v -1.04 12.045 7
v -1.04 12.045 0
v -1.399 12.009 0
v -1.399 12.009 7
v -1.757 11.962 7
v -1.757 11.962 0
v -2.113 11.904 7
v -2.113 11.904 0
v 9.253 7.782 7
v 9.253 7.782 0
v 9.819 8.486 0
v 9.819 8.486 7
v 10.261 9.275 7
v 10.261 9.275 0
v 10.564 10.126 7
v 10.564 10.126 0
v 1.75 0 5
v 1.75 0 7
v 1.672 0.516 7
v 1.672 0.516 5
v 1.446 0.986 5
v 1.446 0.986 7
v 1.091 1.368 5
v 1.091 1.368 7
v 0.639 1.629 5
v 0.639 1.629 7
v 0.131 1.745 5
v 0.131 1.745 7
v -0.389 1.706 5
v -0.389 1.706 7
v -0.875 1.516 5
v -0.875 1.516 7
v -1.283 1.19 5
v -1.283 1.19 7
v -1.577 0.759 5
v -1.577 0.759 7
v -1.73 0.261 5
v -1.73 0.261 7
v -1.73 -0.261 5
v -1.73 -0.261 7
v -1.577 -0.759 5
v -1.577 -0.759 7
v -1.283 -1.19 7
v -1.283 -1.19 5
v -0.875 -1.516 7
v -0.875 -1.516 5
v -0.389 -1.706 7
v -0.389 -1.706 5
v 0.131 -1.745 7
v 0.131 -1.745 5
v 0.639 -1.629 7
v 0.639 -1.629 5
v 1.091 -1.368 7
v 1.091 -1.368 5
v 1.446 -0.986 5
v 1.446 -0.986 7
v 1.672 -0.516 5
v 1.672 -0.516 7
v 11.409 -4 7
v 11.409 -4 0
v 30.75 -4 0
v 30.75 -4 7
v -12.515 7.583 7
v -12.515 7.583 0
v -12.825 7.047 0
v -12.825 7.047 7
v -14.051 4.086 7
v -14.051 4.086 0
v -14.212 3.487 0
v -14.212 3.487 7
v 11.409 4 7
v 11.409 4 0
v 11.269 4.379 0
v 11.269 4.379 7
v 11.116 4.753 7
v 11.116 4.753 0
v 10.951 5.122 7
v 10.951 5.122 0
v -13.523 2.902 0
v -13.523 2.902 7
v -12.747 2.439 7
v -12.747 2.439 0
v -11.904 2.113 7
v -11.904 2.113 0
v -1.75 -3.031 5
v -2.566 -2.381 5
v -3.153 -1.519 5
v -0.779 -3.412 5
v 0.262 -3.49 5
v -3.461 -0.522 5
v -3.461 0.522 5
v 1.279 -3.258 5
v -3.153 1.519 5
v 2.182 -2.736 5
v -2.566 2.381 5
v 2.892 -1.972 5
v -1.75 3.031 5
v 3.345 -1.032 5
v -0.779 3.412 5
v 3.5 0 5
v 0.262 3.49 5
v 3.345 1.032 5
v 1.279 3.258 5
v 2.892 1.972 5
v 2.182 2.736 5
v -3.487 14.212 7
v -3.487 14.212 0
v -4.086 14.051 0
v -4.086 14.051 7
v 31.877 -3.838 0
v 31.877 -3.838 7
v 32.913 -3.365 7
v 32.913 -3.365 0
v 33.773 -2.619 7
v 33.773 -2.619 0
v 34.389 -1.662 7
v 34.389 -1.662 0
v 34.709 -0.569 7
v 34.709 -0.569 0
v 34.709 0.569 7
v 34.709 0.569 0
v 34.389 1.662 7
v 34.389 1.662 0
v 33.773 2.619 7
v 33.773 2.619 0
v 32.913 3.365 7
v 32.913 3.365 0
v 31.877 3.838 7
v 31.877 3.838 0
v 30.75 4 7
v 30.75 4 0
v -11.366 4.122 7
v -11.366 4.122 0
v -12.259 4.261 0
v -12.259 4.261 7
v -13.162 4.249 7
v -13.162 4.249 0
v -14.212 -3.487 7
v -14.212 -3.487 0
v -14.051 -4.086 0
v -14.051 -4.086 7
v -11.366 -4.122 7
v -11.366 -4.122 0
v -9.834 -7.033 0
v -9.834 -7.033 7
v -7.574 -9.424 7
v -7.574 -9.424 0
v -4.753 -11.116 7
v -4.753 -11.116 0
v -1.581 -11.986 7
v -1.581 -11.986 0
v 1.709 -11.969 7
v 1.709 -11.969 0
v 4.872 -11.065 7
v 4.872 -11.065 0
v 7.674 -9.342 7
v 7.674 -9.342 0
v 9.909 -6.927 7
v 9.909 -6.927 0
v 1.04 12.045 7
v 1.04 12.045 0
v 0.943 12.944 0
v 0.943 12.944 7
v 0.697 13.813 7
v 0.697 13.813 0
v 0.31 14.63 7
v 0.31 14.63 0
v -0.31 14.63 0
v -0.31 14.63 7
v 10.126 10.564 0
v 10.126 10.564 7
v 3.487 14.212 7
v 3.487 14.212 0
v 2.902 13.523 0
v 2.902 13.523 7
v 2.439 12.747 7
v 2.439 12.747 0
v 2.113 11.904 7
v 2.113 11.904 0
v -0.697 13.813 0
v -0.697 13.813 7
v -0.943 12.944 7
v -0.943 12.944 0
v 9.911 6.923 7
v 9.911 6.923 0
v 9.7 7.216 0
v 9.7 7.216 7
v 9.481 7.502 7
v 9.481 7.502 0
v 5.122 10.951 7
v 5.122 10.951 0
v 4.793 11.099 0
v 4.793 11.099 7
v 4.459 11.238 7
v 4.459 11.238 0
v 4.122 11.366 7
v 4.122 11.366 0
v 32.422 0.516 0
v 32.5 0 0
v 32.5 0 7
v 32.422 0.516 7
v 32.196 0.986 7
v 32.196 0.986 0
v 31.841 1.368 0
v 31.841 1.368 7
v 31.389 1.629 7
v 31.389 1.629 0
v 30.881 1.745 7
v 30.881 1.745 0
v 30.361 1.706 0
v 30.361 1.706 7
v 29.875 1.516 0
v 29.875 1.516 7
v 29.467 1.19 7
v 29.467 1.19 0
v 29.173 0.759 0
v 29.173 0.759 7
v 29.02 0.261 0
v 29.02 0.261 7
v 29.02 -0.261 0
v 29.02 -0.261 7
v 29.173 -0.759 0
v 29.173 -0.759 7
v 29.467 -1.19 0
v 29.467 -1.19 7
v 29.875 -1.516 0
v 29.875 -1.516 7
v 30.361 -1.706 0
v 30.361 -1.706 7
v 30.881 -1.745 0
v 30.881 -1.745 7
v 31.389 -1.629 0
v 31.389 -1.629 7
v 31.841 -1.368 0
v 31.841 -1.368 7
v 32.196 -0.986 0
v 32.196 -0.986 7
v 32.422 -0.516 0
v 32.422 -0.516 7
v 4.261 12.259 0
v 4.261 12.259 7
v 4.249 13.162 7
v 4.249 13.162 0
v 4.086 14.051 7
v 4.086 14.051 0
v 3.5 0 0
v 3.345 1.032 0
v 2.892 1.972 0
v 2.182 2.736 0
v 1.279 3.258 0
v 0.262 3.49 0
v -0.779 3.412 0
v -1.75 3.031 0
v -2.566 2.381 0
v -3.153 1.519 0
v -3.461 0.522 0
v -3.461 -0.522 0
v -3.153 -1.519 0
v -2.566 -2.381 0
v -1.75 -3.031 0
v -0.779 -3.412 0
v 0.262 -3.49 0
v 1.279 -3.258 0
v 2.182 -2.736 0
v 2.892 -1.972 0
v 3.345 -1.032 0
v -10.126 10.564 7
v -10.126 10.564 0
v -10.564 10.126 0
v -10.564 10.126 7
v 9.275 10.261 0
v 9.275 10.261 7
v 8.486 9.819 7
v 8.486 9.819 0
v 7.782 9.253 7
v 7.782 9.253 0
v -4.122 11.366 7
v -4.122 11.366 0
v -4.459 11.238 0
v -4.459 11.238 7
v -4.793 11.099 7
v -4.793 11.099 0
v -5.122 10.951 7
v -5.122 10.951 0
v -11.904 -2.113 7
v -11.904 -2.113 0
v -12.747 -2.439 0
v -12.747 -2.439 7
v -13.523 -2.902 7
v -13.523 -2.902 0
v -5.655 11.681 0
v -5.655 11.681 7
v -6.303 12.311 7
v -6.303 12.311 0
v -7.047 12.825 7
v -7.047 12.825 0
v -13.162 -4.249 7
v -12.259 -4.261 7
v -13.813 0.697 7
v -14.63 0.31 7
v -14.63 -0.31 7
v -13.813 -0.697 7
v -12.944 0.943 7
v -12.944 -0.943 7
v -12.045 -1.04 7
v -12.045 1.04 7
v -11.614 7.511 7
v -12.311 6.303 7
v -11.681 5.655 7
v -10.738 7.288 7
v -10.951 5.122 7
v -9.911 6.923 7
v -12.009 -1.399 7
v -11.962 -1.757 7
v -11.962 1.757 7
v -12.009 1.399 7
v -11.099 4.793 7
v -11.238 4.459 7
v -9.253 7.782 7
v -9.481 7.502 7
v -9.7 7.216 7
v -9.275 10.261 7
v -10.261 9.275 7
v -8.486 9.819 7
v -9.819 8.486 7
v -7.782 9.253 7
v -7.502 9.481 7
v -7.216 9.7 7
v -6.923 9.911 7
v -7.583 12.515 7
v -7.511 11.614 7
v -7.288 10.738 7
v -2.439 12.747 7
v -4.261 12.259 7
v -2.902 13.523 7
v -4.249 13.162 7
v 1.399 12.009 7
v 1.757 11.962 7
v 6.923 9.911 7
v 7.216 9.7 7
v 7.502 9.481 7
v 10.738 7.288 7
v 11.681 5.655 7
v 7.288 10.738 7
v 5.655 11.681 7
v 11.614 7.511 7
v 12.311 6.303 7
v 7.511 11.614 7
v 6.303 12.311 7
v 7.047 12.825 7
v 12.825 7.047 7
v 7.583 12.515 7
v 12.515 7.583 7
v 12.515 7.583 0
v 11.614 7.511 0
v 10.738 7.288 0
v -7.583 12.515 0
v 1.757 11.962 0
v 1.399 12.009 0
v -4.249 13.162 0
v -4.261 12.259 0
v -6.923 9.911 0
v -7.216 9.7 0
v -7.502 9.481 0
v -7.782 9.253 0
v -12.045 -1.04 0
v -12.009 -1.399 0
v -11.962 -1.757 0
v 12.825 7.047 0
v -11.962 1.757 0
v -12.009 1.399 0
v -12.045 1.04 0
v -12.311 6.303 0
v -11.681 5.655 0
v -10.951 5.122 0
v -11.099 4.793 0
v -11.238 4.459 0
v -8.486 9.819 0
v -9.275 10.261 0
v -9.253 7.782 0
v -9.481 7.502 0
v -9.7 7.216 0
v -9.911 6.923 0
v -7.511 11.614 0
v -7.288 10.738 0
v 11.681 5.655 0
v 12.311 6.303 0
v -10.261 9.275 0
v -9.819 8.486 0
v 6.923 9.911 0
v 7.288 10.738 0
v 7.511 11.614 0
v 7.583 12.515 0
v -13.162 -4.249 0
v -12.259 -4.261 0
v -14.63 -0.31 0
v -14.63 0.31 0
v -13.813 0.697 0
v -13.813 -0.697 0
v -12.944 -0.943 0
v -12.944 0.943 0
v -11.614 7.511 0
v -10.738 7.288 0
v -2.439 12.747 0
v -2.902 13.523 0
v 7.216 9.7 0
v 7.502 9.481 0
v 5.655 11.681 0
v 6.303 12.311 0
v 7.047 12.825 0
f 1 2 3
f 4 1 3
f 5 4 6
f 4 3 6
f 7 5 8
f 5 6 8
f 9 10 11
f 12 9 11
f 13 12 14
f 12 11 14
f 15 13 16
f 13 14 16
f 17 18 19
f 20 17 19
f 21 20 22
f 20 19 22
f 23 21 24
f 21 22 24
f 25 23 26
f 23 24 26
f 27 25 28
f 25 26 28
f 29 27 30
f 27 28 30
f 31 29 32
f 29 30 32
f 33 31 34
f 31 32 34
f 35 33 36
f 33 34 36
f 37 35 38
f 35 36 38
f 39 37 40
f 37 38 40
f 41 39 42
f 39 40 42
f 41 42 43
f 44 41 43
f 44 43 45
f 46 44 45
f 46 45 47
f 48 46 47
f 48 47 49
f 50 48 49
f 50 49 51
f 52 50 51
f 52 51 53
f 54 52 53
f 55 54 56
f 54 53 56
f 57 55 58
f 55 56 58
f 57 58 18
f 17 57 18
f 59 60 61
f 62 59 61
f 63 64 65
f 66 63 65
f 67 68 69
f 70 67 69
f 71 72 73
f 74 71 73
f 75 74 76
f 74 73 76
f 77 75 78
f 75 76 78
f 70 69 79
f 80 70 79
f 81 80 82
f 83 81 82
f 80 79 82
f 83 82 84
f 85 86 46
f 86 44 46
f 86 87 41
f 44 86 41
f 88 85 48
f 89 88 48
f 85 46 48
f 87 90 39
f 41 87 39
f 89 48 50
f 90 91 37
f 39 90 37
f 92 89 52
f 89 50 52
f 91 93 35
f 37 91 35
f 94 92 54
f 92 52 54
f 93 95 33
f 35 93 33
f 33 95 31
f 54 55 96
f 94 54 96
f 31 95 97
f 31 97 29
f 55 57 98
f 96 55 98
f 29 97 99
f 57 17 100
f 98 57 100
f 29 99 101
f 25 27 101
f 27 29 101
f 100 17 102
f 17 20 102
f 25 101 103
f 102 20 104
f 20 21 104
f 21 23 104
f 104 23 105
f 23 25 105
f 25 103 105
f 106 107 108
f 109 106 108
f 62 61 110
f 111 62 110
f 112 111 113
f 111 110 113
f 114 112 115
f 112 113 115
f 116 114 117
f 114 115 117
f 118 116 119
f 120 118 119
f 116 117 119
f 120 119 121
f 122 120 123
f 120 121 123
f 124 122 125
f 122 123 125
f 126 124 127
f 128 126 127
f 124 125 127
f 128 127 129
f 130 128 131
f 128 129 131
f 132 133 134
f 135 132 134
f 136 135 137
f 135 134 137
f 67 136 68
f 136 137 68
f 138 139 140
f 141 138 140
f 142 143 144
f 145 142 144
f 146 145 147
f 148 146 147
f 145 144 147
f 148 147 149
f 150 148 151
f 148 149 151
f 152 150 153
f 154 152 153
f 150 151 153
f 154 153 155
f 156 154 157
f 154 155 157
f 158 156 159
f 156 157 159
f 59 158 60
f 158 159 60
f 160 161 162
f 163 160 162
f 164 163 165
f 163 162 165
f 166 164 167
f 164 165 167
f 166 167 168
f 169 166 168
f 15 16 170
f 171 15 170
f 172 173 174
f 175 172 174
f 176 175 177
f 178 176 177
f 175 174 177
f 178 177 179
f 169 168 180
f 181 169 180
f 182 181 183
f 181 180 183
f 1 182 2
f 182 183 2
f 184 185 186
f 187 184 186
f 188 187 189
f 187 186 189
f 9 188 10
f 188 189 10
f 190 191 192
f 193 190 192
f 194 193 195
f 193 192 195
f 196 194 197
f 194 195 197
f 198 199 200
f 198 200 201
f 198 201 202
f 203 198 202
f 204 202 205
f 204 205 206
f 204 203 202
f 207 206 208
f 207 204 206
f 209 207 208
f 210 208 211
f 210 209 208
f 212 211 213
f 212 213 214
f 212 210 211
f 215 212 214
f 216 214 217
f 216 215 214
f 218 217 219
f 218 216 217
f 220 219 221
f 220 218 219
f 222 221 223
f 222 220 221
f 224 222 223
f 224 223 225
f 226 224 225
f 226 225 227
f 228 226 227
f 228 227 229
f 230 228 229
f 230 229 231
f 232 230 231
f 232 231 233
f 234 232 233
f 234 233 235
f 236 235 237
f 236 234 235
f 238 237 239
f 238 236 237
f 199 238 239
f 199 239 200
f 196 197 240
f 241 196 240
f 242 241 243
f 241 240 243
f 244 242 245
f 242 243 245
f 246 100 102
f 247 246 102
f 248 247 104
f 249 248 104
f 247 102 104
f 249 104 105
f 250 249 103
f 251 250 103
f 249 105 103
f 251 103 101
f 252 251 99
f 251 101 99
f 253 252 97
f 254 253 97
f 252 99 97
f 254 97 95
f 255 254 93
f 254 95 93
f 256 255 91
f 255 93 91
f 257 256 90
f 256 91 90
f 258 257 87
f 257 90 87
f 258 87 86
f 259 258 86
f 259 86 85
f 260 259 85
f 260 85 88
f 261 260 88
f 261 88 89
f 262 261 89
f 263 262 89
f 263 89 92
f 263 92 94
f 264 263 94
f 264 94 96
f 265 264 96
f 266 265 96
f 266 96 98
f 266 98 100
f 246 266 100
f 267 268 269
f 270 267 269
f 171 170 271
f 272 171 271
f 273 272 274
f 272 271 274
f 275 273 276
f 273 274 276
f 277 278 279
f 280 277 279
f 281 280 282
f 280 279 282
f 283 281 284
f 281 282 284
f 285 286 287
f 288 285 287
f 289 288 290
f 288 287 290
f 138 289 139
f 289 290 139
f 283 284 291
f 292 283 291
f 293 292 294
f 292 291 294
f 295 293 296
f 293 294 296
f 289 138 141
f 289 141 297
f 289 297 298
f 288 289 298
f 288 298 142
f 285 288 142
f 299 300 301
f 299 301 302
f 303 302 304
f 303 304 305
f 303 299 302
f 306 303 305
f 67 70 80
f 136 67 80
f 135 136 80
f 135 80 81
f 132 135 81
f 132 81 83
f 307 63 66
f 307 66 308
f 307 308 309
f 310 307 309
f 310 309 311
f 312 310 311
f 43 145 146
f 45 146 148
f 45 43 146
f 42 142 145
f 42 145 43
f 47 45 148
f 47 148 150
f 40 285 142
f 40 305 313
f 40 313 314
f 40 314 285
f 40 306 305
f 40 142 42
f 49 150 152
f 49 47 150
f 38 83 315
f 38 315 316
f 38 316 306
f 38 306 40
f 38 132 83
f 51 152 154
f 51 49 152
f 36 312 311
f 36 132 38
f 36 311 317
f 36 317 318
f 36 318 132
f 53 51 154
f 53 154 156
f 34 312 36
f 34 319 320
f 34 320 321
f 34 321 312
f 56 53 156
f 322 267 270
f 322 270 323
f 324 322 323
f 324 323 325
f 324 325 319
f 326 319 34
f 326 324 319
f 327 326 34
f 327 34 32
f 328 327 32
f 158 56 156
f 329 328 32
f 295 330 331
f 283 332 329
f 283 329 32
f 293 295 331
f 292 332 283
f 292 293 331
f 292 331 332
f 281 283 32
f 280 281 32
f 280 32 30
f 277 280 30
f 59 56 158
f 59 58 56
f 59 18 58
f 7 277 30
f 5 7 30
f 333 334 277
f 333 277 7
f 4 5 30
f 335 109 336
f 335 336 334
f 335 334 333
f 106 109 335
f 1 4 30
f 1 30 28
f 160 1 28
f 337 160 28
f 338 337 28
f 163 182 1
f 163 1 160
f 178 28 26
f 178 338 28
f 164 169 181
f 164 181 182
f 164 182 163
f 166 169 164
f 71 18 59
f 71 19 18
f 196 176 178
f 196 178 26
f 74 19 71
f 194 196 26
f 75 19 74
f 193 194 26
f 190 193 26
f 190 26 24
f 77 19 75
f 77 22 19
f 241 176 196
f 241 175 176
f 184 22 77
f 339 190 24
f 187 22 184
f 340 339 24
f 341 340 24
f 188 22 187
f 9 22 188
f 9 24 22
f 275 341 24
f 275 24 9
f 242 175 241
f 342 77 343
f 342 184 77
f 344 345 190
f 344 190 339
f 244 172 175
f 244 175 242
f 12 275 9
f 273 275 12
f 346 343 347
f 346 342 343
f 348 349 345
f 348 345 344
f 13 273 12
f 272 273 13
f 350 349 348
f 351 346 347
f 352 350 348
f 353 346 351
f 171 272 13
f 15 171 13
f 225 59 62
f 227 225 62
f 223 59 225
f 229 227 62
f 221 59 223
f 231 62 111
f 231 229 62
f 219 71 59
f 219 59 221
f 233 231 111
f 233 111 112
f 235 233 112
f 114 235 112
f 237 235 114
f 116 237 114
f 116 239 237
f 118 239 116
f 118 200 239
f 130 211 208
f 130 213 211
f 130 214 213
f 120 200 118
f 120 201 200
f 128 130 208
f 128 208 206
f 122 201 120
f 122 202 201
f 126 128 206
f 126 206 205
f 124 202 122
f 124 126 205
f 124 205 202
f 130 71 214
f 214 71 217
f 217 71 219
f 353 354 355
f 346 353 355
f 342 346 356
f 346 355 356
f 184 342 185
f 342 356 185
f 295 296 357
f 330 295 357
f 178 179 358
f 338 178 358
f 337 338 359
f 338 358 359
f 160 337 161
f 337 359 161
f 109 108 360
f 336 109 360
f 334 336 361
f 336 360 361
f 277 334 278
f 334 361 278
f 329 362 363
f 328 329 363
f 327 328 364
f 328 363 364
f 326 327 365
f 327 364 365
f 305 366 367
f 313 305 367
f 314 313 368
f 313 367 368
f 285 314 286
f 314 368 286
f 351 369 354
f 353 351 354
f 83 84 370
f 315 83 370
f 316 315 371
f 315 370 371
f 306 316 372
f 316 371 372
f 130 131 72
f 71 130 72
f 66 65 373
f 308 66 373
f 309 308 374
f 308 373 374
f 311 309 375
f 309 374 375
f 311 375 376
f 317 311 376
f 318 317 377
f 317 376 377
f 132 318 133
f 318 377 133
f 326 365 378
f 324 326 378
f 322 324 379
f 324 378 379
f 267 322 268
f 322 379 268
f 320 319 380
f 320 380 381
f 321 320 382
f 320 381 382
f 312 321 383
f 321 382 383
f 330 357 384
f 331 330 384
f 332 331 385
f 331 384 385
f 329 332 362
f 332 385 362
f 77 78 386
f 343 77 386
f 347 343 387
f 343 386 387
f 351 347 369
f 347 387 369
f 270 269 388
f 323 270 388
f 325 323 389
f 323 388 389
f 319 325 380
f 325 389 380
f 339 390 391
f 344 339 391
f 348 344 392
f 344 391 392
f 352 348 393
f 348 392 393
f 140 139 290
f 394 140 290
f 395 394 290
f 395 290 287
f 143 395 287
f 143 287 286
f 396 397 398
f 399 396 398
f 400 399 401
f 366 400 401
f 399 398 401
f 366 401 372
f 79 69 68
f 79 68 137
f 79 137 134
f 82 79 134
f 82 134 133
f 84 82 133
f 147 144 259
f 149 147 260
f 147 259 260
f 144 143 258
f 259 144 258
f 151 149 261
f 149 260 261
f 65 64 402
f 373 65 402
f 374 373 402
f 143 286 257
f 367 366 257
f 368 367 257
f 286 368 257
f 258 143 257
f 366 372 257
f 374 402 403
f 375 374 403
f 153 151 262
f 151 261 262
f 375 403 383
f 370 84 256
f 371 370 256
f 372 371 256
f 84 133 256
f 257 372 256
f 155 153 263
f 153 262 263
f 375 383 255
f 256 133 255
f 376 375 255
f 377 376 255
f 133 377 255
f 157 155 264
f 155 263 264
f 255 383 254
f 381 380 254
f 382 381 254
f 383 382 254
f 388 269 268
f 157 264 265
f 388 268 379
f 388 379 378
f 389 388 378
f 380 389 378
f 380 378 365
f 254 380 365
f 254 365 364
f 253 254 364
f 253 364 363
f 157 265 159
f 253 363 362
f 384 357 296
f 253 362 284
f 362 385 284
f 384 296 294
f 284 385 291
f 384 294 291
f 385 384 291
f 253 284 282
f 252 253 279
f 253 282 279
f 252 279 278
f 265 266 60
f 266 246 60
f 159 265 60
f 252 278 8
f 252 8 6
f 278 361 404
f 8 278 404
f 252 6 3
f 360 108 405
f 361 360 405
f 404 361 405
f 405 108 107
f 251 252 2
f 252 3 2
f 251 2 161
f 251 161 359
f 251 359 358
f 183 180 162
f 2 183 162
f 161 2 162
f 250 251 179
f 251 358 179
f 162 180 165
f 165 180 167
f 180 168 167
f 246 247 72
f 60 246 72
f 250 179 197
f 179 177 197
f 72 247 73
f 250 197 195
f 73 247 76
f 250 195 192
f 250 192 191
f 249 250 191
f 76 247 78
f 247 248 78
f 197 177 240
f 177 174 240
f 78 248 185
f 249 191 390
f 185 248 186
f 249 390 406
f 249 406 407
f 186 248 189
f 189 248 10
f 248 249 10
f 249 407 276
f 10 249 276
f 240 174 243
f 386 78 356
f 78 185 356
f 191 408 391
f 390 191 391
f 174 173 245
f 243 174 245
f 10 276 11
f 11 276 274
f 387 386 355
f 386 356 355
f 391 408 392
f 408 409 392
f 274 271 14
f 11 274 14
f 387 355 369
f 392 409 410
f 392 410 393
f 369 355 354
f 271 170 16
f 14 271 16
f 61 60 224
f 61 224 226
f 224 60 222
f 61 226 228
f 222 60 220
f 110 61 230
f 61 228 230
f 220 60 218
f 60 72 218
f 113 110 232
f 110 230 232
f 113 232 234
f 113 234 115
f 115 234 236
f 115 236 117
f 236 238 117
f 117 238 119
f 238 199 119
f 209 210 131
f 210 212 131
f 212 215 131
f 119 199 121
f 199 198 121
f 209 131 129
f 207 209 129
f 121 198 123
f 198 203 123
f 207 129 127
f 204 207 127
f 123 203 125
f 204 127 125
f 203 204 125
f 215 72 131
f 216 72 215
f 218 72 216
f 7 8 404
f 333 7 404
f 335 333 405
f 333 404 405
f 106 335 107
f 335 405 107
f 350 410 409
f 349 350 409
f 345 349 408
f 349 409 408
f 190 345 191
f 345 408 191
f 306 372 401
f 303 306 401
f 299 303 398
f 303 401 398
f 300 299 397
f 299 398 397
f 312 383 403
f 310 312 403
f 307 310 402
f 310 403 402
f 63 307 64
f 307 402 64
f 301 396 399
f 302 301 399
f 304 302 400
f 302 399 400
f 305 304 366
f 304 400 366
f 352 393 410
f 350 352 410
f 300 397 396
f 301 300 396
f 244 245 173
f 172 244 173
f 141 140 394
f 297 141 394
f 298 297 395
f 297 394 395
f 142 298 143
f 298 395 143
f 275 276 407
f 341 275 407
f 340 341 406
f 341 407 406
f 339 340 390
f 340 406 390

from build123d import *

# Parameters (mm, degrees)
SKETCH1_R           = 12.09
SKETCH1_R_2         = 1.75
BOSS_EXTRUDE2_DEPTH = 7
SKETCH2_R           = 3.5
CUT_EXTRUDE1_DEPTH  = 39.348395012
SKETCH3_R           = 3.5
SKETCH3_R_2         = 1.75
BOSS_EXTRUDE3_DEPTH = 2


with BuildPart() as part:
    # Sketch1 → Boss-Extrude2 (new body)
    # profile 1 of 17: a face of its own
    with BuildSketch(Plane.XY):
        Circle(SKETCH1_R)
    # profile 2 of 17: a face of its own
    with BuildSketch(Plane.XY):
        with BuildLine():
            ThreePointArc((-9.252623584, 7.781841479), (-8.548920985, 8.548920985), (-7.781841479, 9.252623584))
            ThreePointArc((-7.781841479, 9.252623584), (-8.870959341, 10.05645683), (-10.125769107, 10.564175311))
            Line((-10.125769107, 10.564175311), (-10.564175311, 10.125769107))
            ThreePointArc((-10.564175311, 10.125769107), (-10.05645683, 8.870959341), (-9.252623584, 7.781841479))
        make_face()
    # profile 3 of 17: a face of its own
    with BuildSketch(Plane.XY):
        with BuildLine():
            ThreePointArc((-6.9232593, 9.911436862), (-6.045, 10.470247132), (-5.12192646, 10.951436862))
            ThreePointArc((-5.12192646, 10.951436862), (-5.965886177, 12.009764599), (-7.046532125, 12.824951657))
            Line((-7.046532125, 12.824951657), (-7.583467875, 12.514951657))
            ThreePointArc((-7.583467875, 12.514951657), (-7.417818147, 11.171491285), (-6.9232593, 9.911436862))
        make_face()
    # profile 4 of 17: a face of its own
    with BuildSketch(Plane.XY):
        with BuildLine():
            ThreePointArc((-4.122086336, 11.365584201), (-3.129122255, 11.67804324), (-2.112960617, 11.903927815))
            ThreePointArc((-2.112960617, 11.903927815), (-2.65424773, 13.144626757), (-3.487085624, 14.211728743))
            Line((-3.487085624, 14.211728743), (-4.085959636, 14.051260935))
            ThreePointArc((-4.085959636, 14.051260935), (-4.273667417, 12.71070456), (-4.122086336, 11.365584201))
        make_face()
    # profile 5 of 17: a face of its own
    with BuildSketch(Plane.XY):
        with BuildLine():
            Line((0.31, 14.63), (-0.31, 14.63))
            ThreePointArc((-0.31, 14.63), (-0.838273314, 13.383704325), (-1.04, 12.04518576))
            ThreePointArc((-1.04, 12.04518576), (0, 12.09), (1.04, 12.04518576))
            ThreePointArc((1.04, 12.04518576), (0.838273314, 13.383704325), (0.31, 14.63))
        make_face()
    # profile 6 of 17: a face of its own
    with BuildSketch(Plane.XY):
        with BuildLine():
            ThreePointArc((3.487085624, 14.211728743), (2.65424773, 13.144626757), (2.112960617, 11.903927815))
            ThreePointArc((2.112960617, 11.903927815), (3.129122255, 11.67804324), (4.122086336, 11.365584201))
            ThreePointArc((4.122086336, 11.365584201), (4.273667417, 12.71070456), (4.085959636, 14.051260935))
            Line((4.085959636, 14.051260935), (3.487085624, 14.211728743))
        make_face()
    # profile 7 of 17: a face of its own
    with BuildSketch(Plane.XY):
        with BuildLine():
            ThreePointArc((7.046532125, 12.824951657), (5.965886177, 12.009764599), (5.12192646, 10.951436862))
            ThreePointArc((5.12192646, 10.951436862), (6.045, 10.470247132), (6.9232593, 9.911436862))
            ThreePointArc((6.9232593, 9.911436862), (7.417818147, 11.171491285), (7.583467875, 12.514951657))
            Line((7.583467875, 12.514951657), (7.046532125, 12.824951657))
        make_face()
    # profile 8 of 17: a face of its own
    with BuildSketch(Plane.XY):
        with BuildLine():
            ThreePointArc((10.125769107, 10.564175311), (8.870959341, 10.05645683), (7.781841479, 9.252623584))
            ThreePointArc((7.781841479, 9.252623584), (8.548920985, 8.548920985), (9.252623584, 7.781841479))
            ThreePointArc((9.252623584, 7.781841479), (10.05645683, 8.870959341), (10.564175311, 10.125769107))
            Line((10.564175311, 10.125769107), (10.125769107, 10.564175311))
        make_face()
    # profile 9 of 17: a face of its own
    with BuildSketch(Plane.XY):
        with BuildLine():
            ThreePointArc((12.514951657, 7.583467875), (11.171491285, 7.417818147), (9.911436862, 6.9232593))
            ThreePointArc((9.911436862, 6.9232593), (10.470247132, 6.045), (10.951436862, 5.12192646))
            ThreePointArc((10.951436862, 5.12192646), (12.009764599, 5.965886177), (12.824951657, 7.046532125))
            Line((12.824951657, 7.046532125), (12.514951657, 7.583467875))
        make_face()
    # profile 10 of 17: a face of its own
    with BuildSketch(Plane.XY):
        with BuildLine():
            Line((14.07429375, 4), (11.409123542, 4))
            ThreePointArc((11.409123542, 4), (11.694649217, 3.066476756), (11.903927815, 2.112960617))
            ThreePointArc((11.903927815, 2.112960617), (13.144626757, 2.65424773), (14.211728743, 3.487085624))
            Line((14.211728743, 3.487085624), (14.07429375, 4))
        make_face()
    # profile 11 of 17: a face of its own
    with BuildSketch(Plane.XY):
        with BuildLine():
            Line((30.75, 4), (14.07429375, 4))
            Line((14.07429375, 4), (14.211728743, 3.487085624))
            ThreePointArc((14.211728743, 3.487085624), (13.144626757, 2.65424773), (11.903927815, 2.112960617))
            ThreePointArc((11.903927815, 2.112960617), (11.986568374, 1.578061664), (12.04518576, 1.04))
            ThreePointArc((12.04518576, 1.04), (13.383704325, 0.838273314), (14.63, 0.31))
            Line((14.63, 0.31), (14.63, -0.31))
            ThreePointArc((14.63, -0.31), (13.383704325, -0.838273314), (12.04518576, -1.04))
            ThreePointArc((12.04518576, -1.04), (11.986568374, -1.578061664), (11.903927815, -2.112960617))
            ThreePointArc((11.903927815, -2.112960617), (13.144626757, -2.65424773), (14.211728743, -3.487085624))
            Line((14.211728743, -3.487085624), (14.07429375, -4))
            Line((14.07429375, -4), (30.75, -4))
            ThreePointArc((30.75, -4), (34.75, 0), (30.75, 4))
        make_face()
        with Locations((30.75, 0)):
            Circle(SKETCH1_R_2, mode=Mode.SUBTRACT)
    # profile 12 of 17: a face of its own
    with BuildSketch(Plane.XY):
        with BuildLine():
            ThreePointArc((14.63, 0.31), (13.383704325, 0.838273314), (12.04518576, 1.04))
            ThreePointArc((12.04518576, 1.04), (12.078791244, 0.520482544), (12.09, 0))
            ThreePointArc((12.09, 0), (12.078791244, -0.520482544), (12.04518576, -1.04))
            ThreePointArc((12.04518576, -1.04), (13.383704325, -0.838273314), (14.63, -0.31))
            Line((14.63, -0.31), (14.63, 0.31))
        make_face()
    # profile 13 of 17: a face of its own
    with BuildSketch(Plane.XY):
        with BuildLine():
            Line((11.409123542, -4), (14.07429375, -4))
            Line((14.07429375, -4), (14.211728743, -3.487085624))
            ThreePointArc((14.211728743, -3.487085624), (13.144626757, -2.65424773), (11.903927815, -2.112960617))
            ThreePointArc((11.903927815, -2.112960617), (11.694649217, -3.066476756), (11.409123542, -4))
        make_face()
    # profile 14 of 17: a face of its own
    with BuildSketch(Plane.XY):
        with BuildLine():
            ThreePointArc((-10.951436862, 5.12192646), (-10.470247132, 6.045), (-9.911436862, 6.9232593))
            ThreePointArc((-9.911436862, 6.9232593), (-11.171491285, 7.417818147), (-12.514951657, 7.583467875))
            Line((-12.514951657, 7.583467875), (-12.824951657, 7.046532125))
            ThreePointArc((-12.824951657, 7.046532125), (-12.009764599, 5.965886177), (-10.951436862, 5.12192646))
        make_face()
    # profile 15 of 17: a face of its own
    with BuildSketch(Plane.XY):
        with BuildLine():
            ThreePointArc((-11.903927815, 2.112960617), (-11.67804324, 3.129122255), (-11.365584201, 4.122086336))
            ThreePointArc((-11.365584201, 4.122086336), (-12.71070456, 4.273667417), (-14.051260935, 4.085959636))
            Line((-14.051260935, 4.085959636), (-14.211728743, 3.487085624))
            ThreePointArc((-14.211728743, 3.487085624), (-13.144626757, 2.65424773), (-11.903927815, 2.112960617))
        make_face()
    # profile 16 of 17: a face of its own
    with BuildSketch(Plane.XY):
        with BuildLine():
            ThreePointArc((-12.04518576, -1.04), (-12.09, 0), (-12.04518576, 1.04))
            ThreePointArc((-12.04518576, 1.04), (-13.383704325, 0.838273314), (-14.63, 0.31))
            Line((-14.63, 0.31), (-14.63, -0.31))
            ThreePointArc((-14.63, -0.31), (-13.383704325, -0.838273314), (-12.04518576, -1.04))
        make_face()
    # profile 17 of 17: a face of its own
    with BuildSketch(Plane.XY):
        with BuildLine():
            ThreePointArc((-11.365584201, -4.122086336), (-11.67804324, -3.129122255), (-11.903927815, -2.112960617))
            ThreePointArc((-11.903927815, -2.112960617), (-13.144626757, -2.65424773), (-14.211728743, -3.487085624))
            Line((-14.211728743, -3.487085624), (-14.051260935, -4.085959636))
            ThreePointArc((-14.051260935, -4.085959636), (-12.71070456, -4.273667417), (-11.365584201, -4.122086336))
        make_face()
    extrude(amount=BOSS_EXTRUDE2_DEPTH)

    # Sketch2 → Cut-Extrude1 (cut, through all)
    with BuildSketch(Plane.XY.offset(7)):
        Circle(SKETCH2_R)
    extrude(amount=-CUT_EXTRUDE1_DEPTH, mode=Mode.SUBTRACT)

    # Sketch3 → Boss-Extrude3 (add)
    with BuildSketch(Plane.XY.offset(7)):
        Circle(SKETCH3_R)
        Circle(SKETCH3_R_2, mode=Mode.SUBTRACT)
    extrude(amount=-BOSS_EXTRUDE3_DEPTH)


solid = part.part
